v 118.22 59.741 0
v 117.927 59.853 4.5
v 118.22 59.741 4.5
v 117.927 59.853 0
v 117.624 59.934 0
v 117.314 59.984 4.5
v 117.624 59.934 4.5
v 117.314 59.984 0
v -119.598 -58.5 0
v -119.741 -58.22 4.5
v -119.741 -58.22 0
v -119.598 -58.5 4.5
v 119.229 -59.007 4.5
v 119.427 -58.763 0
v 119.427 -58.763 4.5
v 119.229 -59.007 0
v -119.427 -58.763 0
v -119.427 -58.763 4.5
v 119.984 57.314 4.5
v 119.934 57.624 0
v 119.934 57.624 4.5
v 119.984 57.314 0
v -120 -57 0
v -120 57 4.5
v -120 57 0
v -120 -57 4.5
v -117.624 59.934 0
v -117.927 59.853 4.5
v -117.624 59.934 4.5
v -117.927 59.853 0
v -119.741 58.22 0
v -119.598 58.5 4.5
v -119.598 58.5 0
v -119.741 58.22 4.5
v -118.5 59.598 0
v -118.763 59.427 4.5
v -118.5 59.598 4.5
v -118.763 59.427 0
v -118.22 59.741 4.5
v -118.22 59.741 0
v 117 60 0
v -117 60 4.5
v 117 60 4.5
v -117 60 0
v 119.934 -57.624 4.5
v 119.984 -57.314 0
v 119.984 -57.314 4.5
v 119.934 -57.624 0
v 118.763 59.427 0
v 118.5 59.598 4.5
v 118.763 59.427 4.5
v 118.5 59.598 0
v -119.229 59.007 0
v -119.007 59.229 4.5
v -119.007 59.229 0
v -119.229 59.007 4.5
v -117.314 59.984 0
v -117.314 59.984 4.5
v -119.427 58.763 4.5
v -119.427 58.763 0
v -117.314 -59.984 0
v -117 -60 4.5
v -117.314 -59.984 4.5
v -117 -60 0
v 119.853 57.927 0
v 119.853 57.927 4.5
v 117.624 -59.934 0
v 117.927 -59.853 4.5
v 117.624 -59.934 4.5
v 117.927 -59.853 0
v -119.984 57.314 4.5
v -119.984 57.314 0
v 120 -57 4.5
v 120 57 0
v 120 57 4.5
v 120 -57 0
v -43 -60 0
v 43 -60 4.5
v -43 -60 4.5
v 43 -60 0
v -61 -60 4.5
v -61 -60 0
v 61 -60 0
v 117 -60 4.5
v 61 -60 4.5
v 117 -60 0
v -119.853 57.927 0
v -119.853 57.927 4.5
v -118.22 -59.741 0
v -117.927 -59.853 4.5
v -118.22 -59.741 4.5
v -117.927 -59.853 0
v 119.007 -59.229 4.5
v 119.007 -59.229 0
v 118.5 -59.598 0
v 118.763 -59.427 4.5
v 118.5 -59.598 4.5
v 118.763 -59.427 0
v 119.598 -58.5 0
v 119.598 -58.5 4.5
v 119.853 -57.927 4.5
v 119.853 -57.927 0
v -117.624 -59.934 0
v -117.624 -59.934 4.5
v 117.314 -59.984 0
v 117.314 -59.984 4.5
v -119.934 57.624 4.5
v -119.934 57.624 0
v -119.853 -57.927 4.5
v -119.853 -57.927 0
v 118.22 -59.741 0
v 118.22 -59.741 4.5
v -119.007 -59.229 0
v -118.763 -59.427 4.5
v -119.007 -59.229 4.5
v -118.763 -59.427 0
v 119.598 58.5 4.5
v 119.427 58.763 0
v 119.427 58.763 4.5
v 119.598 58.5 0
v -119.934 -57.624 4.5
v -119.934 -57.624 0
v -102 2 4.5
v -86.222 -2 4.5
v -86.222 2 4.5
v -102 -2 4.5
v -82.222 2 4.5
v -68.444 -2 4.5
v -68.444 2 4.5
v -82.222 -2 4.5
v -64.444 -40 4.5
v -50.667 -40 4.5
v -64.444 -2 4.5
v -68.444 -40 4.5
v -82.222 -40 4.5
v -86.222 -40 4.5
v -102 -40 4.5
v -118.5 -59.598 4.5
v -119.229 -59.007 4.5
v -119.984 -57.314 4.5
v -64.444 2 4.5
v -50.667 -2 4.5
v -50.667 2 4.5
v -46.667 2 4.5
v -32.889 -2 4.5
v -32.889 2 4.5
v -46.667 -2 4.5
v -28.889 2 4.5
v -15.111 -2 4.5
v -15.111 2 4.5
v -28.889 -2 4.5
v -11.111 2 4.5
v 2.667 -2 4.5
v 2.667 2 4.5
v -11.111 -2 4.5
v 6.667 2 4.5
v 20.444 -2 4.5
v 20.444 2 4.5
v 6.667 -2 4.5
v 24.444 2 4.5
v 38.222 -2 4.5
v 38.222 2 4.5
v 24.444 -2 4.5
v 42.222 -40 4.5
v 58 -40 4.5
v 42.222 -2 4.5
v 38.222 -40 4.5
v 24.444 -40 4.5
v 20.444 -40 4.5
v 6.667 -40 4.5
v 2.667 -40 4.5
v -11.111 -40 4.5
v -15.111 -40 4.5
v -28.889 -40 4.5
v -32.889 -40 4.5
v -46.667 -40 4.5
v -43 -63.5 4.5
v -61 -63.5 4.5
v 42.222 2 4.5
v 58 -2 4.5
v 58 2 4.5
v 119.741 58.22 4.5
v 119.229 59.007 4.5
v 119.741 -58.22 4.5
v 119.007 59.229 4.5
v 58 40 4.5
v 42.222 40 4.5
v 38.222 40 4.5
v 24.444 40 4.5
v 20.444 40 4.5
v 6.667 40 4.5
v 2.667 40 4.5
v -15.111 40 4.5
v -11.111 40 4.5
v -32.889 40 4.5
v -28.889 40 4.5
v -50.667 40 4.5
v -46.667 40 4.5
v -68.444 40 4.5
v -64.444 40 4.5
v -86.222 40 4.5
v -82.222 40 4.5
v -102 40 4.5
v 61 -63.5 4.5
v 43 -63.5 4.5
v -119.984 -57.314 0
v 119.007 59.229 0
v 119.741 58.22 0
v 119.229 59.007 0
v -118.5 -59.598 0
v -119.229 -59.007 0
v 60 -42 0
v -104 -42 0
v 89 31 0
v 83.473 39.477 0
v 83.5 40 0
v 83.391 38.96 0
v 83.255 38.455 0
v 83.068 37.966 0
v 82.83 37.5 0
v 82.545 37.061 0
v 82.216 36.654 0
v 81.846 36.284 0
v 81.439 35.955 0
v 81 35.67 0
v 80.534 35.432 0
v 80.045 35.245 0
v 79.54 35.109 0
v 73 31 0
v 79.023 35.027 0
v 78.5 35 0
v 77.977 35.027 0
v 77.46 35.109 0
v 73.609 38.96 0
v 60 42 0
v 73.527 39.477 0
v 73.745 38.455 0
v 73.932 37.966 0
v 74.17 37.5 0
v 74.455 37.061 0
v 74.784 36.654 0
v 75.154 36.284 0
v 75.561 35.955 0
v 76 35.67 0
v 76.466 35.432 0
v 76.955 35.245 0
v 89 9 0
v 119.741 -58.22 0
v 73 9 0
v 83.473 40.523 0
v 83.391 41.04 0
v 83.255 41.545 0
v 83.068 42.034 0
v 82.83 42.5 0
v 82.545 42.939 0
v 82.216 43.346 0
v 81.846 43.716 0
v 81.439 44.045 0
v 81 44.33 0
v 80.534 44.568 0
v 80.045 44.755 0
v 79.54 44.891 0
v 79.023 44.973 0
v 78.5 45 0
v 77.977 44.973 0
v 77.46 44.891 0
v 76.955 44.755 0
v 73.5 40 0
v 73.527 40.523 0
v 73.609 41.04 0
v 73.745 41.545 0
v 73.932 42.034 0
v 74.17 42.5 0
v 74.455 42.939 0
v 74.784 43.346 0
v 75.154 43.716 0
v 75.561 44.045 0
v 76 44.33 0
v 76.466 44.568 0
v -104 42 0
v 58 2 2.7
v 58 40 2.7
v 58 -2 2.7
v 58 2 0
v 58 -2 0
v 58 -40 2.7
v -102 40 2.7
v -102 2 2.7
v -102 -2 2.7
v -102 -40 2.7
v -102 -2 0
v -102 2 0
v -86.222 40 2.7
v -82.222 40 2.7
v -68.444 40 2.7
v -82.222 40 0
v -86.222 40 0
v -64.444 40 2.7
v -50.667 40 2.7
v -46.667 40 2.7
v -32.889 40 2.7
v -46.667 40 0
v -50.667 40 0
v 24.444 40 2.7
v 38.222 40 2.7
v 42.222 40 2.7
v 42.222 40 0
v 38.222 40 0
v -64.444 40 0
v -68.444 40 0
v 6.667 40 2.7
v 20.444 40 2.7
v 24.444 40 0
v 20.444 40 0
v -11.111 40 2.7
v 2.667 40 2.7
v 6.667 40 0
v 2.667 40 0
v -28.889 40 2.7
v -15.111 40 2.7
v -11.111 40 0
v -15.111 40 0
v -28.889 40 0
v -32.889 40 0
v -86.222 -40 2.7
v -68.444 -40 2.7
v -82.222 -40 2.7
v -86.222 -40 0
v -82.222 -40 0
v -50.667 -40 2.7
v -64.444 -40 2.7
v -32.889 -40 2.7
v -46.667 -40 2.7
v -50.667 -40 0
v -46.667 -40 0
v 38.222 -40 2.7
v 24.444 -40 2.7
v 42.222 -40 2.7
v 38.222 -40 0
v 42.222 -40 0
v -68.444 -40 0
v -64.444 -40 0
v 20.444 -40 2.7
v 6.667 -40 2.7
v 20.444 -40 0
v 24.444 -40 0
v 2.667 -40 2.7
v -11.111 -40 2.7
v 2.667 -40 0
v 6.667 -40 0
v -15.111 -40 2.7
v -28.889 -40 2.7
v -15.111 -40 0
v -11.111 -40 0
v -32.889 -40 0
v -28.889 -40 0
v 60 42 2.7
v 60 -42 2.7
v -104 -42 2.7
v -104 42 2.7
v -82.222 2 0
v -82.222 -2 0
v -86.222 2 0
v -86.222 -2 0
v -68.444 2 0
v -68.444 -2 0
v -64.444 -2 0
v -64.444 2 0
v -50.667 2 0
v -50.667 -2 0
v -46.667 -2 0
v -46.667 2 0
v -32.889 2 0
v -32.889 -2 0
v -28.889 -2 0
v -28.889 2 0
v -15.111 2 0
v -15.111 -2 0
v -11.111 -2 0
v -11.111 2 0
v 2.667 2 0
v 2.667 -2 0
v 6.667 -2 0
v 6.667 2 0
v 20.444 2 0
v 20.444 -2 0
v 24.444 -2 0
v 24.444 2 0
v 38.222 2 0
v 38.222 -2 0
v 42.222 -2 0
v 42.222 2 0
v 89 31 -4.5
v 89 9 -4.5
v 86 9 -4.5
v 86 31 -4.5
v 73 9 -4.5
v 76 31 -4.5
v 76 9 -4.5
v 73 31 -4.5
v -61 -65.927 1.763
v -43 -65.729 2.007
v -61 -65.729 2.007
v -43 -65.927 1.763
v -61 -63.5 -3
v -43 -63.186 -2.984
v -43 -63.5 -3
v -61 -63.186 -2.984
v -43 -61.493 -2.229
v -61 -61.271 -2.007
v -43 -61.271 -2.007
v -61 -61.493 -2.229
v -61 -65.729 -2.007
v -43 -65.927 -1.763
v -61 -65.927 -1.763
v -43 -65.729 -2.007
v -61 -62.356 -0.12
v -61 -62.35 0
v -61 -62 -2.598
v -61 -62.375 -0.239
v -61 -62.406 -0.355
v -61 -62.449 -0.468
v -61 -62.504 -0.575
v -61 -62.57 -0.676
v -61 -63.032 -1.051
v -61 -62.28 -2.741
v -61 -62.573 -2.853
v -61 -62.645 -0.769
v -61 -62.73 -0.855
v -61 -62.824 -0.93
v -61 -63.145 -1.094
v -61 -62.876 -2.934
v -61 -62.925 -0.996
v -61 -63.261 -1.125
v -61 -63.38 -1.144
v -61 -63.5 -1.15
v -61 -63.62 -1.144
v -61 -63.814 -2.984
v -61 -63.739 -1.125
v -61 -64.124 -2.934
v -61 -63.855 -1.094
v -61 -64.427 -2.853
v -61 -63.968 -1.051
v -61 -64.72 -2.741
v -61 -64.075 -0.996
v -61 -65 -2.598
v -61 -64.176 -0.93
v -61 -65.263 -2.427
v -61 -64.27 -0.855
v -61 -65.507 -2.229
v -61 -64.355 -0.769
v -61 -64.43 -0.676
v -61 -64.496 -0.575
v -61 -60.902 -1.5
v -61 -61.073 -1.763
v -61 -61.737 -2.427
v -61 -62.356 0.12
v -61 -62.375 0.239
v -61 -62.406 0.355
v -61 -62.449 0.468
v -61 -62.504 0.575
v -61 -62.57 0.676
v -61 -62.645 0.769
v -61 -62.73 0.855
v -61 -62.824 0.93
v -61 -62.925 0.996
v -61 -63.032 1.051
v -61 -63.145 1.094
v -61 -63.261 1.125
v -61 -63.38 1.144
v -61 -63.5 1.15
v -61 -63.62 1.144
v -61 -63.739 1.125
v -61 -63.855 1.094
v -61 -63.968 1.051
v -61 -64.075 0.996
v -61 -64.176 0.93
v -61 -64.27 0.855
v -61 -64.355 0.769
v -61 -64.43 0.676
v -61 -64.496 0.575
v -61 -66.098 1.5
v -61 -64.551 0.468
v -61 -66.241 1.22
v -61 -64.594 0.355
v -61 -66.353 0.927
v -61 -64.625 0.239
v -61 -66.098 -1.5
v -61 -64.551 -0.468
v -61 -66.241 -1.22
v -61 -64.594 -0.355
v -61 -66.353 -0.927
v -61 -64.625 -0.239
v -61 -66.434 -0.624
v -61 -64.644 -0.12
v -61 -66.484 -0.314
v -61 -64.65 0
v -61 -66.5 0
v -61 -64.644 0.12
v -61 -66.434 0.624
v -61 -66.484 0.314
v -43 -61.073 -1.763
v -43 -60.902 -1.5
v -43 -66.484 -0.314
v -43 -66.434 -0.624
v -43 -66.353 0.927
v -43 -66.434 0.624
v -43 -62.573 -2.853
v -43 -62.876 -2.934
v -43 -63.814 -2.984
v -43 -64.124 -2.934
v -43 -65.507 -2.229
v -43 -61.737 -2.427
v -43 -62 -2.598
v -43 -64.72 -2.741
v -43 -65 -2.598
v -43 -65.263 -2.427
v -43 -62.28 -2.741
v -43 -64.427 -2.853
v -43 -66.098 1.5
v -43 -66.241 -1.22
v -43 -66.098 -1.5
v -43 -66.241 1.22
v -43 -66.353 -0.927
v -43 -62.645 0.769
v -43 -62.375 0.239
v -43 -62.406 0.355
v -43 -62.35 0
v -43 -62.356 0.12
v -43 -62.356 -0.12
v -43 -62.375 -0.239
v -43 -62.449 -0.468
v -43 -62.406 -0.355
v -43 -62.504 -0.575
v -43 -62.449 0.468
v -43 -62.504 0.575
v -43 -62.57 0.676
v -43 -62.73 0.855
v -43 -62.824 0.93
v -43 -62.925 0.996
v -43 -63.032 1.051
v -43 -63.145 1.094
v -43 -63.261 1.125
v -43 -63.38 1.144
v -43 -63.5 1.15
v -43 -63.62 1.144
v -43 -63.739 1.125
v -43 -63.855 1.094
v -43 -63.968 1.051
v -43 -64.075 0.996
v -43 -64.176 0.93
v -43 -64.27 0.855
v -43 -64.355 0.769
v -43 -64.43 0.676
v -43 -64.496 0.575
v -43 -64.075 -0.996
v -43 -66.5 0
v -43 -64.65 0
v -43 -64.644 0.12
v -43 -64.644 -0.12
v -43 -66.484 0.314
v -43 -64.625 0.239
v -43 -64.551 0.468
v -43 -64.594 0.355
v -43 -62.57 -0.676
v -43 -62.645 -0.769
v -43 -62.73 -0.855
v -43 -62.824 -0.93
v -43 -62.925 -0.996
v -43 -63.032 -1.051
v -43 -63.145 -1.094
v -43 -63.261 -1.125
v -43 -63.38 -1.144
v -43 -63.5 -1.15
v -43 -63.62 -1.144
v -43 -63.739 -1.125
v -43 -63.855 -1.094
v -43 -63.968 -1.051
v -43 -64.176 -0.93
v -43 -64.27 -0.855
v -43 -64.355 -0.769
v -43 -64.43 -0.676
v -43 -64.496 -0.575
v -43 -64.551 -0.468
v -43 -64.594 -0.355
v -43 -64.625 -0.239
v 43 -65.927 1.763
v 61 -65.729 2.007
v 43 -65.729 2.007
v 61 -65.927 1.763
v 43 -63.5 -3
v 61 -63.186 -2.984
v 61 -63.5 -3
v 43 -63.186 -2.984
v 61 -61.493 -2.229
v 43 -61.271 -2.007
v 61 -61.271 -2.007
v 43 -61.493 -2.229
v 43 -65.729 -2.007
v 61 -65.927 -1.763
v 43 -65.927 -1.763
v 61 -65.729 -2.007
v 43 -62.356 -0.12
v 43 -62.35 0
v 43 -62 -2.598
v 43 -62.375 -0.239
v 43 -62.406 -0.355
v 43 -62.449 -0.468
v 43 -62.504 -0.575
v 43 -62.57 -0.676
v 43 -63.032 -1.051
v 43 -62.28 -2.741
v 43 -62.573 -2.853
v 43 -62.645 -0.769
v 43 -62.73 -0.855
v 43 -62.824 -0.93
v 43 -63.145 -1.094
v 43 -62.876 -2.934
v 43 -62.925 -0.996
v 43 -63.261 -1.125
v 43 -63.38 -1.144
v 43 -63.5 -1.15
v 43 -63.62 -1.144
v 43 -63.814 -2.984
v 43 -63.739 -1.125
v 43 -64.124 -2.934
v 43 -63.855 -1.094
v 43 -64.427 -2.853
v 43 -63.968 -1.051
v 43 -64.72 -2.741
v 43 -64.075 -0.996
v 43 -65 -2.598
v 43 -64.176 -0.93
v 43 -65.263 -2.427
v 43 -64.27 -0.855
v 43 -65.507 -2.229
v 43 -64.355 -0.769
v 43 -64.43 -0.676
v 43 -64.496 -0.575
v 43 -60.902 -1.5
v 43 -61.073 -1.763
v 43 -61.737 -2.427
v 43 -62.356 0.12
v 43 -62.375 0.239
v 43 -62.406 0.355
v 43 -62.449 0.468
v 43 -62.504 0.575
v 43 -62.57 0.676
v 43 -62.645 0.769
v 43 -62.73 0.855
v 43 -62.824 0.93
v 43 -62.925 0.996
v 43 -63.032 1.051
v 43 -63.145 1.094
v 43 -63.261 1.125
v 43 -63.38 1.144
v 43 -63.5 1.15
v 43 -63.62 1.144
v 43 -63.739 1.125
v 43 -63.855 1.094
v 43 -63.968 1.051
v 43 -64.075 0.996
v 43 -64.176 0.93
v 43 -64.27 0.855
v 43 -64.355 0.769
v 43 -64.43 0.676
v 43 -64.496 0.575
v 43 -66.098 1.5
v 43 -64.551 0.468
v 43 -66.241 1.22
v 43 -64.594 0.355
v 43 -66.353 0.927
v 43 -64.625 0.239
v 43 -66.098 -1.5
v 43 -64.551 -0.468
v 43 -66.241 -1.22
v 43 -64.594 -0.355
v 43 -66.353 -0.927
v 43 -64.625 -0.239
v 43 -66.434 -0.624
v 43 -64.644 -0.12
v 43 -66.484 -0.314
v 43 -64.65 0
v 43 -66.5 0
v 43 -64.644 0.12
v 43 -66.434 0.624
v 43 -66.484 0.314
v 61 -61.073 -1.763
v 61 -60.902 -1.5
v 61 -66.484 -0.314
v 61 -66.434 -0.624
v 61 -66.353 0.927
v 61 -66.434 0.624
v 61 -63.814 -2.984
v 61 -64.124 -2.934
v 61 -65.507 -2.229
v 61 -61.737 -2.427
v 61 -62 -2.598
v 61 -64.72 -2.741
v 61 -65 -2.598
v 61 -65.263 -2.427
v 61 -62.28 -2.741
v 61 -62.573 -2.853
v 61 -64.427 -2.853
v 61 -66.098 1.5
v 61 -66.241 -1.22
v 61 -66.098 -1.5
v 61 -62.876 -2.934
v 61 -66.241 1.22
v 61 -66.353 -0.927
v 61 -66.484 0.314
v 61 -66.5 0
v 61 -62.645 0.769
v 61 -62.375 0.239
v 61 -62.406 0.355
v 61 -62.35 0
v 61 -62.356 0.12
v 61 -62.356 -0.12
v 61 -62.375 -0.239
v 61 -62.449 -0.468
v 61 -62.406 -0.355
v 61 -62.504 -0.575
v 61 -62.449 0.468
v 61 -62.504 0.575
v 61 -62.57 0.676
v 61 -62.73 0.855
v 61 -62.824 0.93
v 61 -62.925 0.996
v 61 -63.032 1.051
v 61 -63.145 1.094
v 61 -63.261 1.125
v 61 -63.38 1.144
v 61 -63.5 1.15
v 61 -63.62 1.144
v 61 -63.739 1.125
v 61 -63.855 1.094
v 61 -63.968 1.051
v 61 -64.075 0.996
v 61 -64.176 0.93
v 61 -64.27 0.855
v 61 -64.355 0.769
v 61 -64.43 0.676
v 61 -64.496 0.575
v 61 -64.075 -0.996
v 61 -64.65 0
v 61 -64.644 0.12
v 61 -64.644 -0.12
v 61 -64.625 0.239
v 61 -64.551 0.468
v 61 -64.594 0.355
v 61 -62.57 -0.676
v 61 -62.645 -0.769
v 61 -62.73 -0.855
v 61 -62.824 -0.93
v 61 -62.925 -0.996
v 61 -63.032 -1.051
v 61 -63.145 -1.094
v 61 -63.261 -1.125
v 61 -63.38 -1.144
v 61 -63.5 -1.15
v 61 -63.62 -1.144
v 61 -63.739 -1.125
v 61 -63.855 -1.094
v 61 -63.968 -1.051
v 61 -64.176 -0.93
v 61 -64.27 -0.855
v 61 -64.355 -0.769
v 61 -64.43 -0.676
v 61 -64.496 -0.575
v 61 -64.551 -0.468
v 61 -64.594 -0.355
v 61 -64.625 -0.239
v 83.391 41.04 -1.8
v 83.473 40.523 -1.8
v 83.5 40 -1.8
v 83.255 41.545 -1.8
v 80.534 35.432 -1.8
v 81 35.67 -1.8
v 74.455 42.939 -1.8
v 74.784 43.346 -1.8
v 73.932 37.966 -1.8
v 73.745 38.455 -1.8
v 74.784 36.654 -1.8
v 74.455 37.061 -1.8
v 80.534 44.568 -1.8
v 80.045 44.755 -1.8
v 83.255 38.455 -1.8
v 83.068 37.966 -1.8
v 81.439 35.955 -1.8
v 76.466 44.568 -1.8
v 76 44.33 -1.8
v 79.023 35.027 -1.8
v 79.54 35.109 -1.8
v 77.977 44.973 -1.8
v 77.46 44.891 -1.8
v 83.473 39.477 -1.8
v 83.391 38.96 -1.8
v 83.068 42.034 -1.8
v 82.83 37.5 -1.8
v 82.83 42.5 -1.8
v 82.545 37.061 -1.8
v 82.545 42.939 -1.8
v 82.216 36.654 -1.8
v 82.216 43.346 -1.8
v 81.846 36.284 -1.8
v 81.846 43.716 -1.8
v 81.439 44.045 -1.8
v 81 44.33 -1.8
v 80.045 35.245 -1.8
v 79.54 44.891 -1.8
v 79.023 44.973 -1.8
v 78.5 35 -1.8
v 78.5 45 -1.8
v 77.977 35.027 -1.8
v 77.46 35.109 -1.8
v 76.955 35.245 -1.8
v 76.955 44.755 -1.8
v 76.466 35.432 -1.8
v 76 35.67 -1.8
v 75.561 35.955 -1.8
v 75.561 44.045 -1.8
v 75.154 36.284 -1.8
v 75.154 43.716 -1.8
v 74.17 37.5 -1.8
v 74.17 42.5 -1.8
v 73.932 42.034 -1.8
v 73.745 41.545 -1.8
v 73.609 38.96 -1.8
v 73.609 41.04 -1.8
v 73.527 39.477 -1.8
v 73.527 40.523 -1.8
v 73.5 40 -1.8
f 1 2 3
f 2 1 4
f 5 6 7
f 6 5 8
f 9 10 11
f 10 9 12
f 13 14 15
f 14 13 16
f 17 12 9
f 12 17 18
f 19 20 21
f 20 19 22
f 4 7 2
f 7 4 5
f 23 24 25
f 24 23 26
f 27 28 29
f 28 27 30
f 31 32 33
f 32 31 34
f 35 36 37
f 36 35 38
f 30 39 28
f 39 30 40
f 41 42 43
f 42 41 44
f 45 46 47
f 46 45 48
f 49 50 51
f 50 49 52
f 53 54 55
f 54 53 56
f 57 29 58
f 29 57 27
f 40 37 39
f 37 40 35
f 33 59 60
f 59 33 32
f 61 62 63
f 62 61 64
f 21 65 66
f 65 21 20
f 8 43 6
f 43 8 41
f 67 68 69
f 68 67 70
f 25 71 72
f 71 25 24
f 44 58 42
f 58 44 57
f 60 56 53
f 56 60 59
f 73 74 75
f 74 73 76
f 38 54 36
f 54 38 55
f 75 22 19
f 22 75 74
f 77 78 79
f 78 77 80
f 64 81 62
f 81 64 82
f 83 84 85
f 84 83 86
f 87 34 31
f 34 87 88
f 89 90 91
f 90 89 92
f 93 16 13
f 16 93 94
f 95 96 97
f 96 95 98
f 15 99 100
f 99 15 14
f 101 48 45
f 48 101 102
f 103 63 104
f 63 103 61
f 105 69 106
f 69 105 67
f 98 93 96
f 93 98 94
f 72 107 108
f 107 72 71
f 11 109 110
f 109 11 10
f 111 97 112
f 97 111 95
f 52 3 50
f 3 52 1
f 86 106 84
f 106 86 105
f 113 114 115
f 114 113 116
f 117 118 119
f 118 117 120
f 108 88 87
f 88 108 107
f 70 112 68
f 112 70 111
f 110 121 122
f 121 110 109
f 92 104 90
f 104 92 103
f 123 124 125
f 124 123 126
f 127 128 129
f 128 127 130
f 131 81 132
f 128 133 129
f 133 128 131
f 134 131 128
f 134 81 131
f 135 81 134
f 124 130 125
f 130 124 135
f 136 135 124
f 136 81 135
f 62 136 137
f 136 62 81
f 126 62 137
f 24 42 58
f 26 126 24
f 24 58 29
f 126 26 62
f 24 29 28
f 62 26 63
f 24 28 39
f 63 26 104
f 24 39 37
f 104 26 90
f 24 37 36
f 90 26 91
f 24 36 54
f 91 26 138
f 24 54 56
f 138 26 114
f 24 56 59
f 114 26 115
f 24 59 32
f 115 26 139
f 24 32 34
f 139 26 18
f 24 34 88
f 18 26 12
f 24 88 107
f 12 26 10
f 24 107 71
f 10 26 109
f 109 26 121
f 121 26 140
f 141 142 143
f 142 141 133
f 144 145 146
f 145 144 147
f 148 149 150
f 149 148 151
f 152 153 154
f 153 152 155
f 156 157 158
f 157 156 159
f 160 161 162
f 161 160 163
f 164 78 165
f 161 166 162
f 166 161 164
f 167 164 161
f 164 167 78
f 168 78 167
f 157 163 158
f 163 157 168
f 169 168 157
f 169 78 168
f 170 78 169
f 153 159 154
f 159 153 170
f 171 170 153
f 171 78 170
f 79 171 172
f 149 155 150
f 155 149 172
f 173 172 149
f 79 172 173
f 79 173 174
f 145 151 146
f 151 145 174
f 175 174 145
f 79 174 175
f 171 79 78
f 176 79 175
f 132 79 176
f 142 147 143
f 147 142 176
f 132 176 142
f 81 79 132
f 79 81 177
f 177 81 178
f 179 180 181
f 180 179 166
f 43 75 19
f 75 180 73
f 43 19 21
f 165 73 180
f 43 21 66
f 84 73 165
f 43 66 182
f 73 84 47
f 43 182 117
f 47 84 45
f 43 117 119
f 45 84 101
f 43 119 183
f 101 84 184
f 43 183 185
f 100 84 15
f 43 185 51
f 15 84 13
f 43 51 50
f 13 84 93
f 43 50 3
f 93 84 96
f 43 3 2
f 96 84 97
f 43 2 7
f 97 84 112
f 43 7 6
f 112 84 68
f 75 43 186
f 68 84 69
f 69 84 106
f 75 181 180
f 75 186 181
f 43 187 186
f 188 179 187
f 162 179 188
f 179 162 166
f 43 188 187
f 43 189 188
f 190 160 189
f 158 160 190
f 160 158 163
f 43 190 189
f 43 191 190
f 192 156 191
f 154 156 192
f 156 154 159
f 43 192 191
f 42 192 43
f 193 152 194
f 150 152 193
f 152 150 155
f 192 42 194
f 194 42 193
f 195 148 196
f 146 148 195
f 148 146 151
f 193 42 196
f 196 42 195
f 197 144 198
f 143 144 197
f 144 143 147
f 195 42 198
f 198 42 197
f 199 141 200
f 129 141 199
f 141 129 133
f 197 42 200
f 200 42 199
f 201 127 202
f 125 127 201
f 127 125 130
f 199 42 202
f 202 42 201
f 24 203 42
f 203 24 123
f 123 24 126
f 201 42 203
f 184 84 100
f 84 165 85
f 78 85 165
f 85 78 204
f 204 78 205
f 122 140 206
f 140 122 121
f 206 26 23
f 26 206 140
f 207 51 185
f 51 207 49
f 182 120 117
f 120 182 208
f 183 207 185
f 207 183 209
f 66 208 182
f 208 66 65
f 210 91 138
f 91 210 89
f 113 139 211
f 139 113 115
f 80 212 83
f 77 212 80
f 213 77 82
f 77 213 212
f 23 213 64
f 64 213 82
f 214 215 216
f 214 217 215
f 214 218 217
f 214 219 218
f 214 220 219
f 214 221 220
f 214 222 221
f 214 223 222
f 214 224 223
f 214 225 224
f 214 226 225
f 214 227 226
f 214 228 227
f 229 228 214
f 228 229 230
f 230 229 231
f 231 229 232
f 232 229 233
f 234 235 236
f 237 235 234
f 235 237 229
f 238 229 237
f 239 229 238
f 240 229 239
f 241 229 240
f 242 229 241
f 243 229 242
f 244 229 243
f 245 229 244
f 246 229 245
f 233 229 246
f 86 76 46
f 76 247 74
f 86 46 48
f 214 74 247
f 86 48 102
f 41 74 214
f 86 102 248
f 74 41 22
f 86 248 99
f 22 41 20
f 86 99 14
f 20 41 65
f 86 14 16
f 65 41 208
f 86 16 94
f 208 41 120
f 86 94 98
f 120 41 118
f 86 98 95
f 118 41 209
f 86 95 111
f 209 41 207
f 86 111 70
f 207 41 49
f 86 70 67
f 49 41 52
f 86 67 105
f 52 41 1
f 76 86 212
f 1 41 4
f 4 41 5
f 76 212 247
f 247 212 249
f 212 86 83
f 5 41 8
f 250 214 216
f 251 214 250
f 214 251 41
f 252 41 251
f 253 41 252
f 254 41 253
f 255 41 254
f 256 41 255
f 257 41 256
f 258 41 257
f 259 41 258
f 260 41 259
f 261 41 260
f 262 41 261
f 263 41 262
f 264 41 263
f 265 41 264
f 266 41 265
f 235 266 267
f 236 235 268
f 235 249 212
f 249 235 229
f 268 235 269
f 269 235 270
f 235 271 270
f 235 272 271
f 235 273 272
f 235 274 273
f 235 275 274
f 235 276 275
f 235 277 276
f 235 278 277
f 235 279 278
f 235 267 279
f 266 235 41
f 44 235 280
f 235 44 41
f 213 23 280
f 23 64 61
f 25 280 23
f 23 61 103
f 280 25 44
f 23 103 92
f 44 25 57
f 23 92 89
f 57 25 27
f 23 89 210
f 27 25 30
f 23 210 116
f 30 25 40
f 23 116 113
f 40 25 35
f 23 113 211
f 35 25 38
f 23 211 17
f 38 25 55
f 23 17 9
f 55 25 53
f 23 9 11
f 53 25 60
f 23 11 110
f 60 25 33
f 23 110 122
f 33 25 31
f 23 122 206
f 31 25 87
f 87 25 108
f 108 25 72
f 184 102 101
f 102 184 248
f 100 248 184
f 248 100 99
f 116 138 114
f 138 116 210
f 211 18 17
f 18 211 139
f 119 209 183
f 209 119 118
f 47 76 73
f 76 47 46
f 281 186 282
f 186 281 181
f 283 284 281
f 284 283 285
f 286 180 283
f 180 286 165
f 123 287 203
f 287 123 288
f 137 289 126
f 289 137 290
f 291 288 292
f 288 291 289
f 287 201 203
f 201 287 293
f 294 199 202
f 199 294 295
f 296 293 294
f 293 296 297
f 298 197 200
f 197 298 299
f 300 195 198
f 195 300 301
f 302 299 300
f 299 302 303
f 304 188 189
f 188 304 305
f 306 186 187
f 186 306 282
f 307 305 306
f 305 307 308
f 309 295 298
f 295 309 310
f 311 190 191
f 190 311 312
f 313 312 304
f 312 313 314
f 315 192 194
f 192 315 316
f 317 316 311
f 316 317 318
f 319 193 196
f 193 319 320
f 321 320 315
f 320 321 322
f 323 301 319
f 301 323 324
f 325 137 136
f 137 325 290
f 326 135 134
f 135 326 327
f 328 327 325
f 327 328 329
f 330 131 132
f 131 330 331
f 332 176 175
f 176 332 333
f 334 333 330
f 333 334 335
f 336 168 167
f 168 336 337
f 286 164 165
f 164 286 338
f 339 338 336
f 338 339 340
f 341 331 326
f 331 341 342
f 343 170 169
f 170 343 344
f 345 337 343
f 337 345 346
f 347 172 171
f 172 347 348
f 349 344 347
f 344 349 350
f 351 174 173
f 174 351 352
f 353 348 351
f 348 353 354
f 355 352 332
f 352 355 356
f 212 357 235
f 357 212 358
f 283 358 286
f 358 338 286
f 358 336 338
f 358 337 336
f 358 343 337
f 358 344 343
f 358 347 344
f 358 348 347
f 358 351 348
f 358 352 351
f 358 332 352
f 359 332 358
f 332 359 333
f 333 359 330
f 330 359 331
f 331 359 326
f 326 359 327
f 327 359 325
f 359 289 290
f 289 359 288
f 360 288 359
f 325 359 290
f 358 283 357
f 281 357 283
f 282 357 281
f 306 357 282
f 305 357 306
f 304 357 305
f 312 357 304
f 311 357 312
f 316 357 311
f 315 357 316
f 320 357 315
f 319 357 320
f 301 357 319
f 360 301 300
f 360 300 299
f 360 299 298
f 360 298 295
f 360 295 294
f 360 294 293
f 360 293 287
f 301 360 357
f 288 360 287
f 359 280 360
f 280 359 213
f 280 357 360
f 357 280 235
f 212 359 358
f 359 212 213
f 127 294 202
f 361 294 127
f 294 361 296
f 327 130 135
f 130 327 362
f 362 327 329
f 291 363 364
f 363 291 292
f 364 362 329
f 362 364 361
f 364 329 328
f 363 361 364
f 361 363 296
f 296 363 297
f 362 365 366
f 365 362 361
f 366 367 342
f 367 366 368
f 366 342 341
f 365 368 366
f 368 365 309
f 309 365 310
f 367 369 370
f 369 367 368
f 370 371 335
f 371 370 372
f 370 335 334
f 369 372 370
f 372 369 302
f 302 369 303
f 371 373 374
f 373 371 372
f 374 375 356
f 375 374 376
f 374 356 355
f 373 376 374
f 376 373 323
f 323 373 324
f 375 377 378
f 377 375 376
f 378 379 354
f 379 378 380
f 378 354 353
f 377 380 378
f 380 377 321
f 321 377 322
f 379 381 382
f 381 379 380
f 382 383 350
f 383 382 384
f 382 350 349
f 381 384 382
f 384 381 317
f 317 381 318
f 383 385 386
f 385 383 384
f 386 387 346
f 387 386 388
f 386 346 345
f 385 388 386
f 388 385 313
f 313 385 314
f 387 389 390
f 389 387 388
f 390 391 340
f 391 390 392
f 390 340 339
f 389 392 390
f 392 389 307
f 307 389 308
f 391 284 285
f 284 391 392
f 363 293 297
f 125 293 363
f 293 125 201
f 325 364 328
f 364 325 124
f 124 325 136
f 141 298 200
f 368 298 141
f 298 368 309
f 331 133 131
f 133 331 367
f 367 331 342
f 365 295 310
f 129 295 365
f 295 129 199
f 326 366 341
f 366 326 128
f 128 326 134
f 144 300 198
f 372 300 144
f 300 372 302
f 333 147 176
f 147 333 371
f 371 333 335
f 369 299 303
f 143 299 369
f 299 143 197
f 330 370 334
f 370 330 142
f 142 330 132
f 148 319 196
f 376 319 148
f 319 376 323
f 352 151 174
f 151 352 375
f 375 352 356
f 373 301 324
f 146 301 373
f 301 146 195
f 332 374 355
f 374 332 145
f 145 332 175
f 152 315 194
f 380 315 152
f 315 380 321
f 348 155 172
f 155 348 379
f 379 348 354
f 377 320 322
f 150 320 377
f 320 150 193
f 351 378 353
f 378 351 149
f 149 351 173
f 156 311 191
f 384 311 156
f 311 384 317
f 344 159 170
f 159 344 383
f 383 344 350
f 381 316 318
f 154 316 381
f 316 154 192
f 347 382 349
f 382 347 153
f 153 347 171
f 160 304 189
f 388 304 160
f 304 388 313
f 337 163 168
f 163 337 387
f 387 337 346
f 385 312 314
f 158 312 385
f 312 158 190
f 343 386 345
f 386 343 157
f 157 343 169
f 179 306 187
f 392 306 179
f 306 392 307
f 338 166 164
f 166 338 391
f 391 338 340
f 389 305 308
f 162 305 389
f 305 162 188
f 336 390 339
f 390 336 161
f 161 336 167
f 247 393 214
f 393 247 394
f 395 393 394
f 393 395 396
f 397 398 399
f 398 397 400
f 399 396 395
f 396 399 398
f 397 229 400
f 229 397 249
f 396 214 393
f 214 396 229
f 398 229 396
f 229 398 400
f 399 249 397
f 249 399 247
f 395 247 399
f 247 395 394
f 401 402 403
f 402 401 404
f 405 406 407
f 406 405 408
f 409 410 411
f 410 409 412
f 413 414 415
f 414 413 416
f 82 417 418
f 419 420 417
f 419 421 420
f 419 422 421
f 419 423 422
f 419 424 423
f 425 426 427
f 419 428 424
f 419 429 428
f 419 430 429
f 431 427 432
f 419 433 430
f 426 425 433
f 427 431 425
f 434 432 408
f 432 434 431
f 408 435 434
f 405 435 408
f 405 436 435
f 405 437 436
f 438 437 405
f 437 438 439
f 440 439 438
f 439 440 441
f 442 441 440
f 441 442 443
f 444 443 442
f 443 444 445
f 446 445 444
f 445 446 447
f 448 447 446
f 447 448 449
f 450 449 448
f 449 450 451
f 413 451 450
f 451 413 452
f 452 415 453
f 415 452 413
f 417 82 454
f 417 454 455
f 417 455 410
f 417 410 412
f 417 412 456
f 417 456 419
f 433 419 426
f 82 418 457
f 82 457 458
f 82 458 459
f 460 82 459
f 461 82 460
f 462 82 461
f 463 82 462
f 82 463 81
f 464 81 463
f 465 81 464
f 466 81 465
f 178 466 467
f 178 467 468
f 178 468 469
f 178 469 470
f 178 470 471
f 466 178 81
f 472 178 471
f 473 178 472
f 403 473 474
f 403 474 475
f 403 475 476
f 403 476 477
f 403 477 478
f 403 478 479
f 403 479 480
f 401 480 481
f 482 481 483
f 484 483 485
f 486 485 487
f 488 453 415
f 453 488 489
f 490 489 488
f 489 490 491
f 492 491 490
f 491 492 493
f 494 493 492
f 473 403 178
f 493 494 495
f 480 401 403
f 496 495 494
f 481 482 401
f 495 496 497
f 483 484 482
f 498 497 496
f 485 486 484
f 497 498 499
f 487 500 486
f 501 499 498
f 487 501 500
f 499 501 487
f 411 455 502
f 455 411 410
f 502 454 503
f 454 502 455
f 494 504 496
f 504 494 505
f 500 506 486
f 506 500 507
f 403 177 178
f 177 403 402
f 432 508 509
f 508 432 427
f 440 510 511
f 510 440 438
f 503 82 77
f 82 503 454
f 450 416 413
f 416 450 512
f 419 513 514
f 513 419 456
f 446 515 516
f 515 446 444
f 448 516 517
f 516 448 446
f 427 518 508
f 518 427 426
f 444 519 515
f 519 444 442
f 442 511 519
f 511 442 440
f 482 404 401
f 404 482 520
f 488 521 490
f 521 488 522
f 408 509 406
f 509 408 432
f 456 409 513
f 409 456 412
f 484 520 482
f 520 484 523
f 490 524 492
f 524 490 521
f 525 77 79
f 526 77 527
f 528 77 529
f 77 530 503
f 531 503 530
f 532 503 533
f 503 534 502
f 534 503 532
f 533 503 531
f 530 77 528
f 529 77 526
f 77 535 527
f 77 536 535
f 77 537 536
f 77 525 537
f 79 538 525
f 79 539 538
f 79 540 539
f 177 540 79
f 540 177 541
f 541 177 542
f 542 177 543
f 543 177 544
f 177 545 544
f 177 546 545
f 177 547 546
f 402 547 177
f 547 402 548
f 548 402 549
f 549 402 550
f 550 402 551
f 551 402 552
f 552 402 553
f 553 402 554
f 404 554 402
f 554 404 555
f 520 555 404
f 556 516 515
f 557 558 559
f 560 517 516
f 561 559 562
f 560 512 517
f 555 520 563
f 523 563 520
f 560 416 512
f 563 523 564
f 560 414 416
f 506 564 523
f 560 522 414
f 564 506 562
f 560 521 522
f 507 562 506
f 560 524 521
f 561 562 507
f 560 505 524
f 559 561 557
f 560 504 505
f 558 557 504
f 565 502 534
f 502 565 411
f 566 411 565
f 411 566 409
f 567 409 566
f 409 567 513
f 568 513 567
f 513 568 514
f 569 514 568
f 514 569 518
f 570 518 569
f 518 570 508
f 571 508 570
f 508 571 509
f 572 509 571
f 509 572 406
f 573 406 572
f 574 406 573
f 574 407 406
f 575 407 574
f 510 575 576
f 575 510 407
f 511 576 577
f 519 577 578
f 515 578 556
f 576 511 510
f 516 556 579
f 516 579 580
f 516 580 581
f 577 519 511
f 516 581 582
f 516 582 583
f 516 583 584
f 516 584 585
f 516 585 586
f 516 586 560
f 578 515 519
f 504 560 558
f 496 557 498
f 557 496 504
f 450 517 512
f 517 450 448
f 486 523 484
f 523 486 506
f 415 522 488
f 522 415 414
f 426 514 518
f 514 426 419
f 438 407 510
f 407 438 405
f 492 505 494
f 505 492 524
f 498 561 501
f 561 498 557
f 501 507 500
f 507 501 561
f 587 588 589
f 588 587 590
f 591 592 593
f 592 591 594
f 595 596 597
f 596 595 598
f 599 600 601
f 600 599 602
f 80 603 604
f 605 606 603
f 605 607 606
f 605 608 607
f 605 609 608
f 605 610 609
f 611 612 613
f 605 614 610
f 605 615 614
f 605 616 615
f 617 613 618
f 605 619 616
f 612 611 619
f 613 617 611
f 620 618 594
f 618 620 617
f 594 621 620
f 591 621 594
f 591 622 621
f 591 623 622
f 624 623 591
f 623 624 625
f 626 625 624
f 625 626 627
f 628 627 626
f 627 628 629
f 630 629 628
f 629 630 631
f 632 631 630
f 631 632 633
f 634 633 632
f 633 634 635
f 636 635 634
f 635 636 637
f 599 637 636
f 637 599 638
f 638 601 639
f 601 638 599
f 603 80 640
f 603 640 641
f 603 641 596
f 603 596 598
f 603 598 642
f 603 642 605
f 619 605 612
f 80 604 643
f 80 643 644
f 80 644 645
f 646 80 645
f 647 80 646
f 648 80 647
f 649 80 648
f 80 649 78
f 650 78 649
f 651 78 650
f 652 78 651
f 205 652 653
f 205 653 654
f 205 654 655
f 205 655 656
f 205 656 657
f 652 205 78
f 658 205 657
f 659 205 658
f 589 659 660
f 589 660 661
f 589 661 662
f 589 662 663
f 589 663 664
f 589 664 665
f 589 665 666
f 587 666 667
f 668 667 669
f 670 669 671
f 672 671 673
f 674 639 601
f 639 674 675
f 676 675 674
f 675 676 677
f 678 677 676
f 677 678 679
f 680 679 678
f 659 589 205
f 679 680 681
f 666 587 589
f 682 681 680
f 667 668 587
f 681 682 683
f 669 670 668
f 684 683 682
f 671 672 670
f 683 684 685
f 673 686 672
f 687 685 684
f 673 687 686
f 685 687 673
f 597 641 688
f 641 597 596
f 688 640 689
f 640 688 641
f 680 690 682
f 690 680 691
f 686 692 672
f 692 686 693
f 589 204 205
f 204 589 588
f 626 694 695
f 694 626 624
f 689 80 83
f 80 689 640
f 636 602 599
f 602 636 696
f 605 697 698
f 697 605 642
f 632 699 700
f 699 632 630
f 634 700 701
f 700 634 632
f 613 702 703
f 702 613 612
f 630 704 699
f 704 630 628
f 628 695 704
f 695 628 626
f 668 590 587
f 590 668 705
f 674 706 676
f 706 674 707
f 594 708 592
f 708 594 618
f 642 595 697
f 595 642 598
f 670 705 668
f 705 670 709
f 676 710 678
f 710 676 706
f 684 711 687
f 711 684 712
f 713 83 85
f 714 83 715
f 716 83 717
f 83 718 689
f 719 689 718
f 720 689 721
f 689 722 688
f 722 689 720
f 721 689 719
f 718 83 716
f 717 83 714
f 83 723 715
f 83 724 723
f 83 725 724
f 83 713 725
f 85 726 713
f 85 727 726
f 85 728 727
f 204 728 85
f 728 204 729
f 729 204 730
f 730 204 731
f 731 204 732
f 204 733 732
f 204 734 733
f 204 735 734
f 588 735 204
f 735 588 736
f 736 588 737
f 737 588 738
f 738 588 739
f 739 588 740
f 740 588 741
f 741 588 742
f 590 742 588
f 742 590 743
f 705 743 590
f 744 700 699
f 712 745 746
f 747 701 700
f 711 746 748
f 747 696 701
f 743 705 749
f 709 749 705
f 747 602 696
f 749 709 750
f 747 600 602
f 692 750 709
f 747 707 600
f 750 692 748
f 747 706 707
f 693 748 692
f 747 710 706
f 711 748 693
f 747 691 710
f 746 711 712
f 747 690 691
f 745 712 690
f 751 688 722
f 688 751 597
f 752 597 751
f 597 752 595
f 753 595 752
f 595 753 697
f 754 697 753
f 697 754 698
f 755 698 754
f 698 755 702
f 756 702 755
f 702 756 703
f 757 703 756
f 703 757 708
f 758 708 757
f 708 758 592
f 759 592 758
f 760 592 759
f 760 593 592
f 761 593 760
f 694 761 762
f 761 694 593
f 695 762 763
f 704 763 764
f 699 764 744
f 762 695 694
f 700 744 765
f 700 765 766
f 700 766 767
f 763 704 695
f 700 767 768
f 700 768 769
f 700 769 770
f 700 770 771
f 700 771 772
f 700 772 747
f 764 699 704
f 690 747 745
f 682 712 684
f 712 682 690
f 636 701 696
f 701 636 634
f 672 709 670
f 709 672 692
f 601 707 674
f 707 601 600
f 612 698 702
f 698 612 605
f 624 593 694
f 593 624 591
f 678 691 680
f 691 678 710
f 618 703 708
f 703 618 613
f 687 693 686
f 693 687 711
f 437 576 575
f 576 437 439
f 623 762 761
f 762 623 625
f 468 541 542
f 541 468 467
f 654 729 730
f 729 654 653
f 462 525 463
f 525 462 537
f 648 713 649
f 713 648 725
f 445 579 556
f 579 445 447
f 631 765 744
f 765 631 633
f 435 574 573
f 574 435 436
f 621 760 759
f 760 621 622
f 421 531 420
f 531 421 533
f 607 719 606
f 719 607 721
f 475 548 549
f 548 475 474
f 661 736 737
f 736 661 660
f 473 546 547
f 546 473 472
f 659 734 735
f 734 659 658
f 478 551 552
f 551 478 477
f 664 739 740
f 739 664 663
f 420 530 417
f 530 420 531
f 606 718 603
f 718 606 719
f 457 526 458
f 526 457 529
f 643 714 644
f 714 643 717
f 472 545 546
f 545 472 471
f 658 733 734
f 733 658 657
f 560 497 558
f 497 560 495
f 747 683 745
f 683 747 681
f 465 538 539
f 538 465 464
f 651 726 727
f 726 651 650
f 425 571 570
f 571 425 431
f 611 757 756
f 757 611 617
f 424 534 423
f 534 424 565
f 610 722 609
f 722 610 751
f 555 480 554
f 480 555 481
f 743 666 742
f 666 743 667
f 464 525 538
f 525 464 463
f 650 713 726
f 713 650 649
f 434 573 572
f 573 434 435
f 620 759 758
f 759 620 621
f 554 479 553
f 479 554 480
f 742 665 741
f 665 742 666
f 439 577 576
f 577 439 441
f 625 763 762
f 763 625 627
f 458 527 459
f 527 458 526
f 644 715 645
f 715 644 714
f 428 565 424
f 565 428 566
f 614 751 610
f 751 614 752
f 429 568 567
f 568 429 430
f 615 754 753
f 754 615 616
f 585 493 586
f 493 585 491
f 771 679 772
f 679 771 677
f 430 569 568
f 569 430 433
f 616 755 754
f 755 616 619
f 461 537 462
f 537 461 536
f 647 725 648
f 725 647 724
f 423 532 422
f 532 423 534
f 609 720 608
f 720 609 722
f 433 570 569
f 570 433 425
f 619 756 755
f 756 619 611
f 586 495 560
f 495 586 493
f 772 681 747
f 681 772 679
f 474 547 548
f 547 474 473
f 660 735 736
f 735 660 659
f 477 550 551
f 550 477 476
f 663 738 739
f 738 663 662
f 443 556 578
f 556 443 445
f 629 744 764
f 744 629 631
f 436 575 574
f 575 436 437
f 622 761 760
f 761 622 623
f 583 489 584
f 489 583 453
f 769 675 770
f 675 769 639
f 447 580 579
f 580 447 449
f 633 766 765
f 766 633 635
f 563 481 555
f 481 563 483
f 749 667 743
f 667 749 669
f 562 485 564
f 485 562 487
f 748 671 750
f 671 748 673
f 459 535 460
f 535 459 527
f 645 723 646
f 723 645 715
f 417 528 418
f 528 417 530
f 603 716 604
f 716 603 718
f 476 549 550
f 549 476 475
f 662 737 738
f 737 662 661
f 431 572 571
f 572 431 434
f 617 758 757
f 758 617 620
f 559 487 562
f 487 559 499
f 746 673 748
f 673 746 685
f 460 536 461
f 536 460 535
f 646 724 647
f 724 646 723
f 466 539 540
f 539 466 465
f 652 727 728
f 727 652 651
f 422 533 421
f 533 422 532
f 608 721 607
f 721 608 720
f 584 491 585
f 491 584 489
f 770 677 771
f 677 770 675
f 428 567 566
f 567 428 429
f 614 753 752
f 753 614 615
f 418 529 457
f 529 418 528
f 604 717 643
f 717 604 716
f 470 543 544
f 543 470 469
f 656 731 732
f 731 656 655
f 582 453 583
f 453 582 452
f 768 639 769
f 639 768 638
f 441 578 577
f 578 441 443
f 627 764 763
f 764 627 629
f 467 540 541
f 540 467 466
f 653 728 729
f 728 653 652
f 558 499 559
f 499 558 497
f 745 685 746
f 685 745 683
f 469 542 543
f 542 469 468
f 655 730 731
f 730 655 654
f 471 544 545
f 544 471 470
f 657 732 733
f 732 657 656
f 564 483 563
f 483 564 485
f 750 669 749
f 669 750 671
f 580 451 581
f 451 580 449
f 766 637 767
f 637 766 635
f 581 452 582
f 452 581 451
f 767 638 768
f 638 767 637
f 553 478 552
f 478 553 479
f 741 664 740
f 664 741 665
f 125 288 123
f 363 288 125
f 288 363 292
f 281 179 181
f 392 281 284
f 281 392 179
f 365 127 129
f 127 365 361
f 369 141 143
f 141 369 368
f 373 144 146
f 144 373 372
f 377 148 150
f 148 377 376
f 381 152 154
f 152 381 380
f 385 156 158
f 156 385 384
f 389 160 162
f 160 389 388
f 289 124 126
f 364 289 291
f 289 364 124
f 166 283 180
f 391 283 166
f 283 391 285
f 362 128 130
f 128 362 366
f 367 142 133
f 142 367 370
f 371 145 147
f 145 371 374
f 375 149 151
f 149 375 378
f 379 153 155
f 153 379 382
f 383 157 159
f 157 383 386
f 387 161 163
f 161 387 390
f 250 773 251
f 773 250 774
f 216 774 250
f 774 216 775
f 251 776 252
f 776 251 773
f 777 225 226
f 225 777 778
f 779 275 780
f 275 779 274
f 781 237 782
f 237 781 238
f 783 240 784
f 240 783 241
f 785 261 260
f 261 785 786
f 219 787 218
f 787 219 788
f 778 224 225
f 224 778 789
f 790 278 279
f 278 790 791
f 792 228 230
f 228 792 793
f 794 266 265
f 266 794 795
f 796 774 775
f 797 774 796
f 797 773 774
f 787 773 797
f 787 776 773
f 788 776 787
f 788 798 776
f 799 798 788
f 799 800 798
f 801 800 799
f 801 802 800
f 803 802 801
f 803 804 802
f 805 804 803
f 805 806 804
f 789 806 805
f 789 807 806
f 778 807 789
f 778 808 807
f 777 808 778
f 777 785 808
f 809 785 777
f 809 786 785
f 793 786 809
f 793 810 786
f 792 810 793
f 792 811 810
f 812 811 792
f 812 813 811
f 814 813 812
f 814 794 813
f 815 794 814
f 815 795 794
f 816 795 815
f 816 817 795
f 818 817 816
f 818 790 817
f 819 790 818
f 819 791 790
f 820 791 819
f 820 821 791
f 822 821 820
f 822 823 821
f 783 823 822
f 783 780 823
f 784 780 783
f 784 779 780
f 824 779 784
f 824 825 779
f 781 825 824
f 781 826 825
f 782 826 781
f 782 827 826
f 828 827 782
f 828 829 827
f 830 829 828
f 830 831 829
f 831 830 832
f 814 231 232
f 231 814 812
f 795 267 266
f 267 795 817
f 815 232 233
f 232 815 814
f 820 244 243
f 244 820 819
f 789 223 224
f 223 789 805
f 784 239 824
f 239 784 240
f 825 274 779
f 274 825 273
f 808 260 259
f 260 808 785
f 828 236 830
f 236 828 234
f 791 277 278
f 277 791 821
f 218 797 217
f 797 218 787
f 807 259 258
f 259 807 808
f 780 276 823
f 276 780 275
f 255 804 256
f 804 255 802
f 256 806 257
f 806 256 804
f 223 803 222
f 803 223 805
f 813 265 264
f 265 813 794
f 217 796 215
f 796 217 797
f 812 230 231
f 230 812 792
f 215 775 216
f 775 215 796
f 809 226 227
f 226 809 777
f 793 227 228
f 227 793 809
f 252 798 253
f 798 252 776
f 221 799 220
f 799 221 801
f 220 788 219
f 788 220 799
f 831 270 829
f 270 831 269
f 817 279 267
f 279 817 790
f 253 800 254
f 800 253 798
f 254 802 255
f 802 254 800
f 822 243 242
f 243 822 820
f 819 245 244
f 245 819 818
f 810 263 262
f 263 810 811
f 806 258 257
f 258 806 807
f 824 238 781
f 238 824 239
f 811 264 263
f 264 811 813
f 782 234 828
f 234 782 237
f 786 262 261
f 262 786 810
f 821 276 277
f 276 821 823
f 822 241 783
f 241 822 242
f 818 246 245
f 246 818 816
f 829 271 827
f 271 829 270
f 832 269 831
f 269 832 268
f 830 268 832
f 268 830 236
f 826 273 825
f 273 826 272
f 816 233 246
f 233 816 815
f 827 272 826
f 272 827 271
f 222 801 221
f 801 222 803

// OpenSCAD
// ===================================================================
// 智能玩具电子锁盒 - 零部件 2: 顶盖 (Top Lid with Armored Skylight)
// CAD 级高精度生产模型
// ===================================================================

$fn = 60;

total_length   = 240.0;
total_width    = 120.0;
lid_thickness  = 4.5;
fillet_r       = 3.0;

// 天窗视窗尺寸
win_length     = 160.0;
win_width      = 80.0;
win_center_x   = -22.0;
acrylic_thick  = 2.5;

module top_lid() {
    difference() {
        // 1. 顶盖主平板基体 (带倒角)
        hull() {
            translate([-total_length/2 + fillet_r, -total_width/2 + fillet_r, 0])
                cylinder(r=fillet_r, h=lid_thickness);
            translate([total_length/2 - fillet_r, -total_width/2 + fillet_r, 0])
                cylinder(r=fillet_r, h=lid_thickness);
            translate([-total_length/2 + fillet_r, total_width/2 - fillet_r, 0])
                cylinder(r=fillet_r, h=lid_thickness);
            translate([total_length/2 - fillet_r, total_width/2 - fillet_r, 0])
                cylinder(r=fillet_r, h=lid_thickness);
        }

        // 2. 挖空天窗视窗通孔
        translate([win_center_x - win_length/2, -win_width/2, -1])
            cube([win_length, win_width, lid_thickness + 2]);

        // 3. 挖出内侧亚克力沉槽 (Under Pocket, 留 2.5mm 深台阶)
        translate([win_center_x - win_length/2 - 2, -win_width/2 - 2, -0.1])
            cube([win_length + 4, win_width + 4, acrylic_thick + 0.3]);
    }

    // --- 4. 一体化重型防暴格栅 (Prison Bars) ---
    // 8 根横向跨梁 (跨过 win_width)
    rib_count = 8;
    rib_width = 4.0;
    spacing = win_length / (rib_count + 1);

    for (i = [1 : rib_count]) {
        translate([win_center_x - win_length/2 + i * spacing - rib_width/2, -win_width/2, 0])
            cube([rib_width, win_width, lid_thickness]);
    }

    // 1 根纵向中心大梁 (Spine)
    translate([win_center_x - win_length/2, -2.0, 0])
        cube([win_length, 4.0, lid_thickness]);

    // --- 5. 顶盖内侧燕尾滑槽 (Dovetail Female Rail) ---
    // 位置: 靠近隔板锁钩处 (X = 81, Y = 20)
    translate([81 - 8, 20 - 11, -4.5]) {
        difference() {
            // 外滑槽座
            cube([16, 22, 4.5]);
            // 内部燕尾母槽 (倒梯形)
            translate([8, -1, 0])
                rotate([-90, 0, 0])
                linear_extrude(height=24)
                polygon(points=[[-5, 0], [5, 0], [7, 4.6], [-7, 4.6]]);
        }
    }

    // --- 6. 后置铰链公耳 (Mating Hinge Knuckles at Y=-total_width/2) ---
    // 销轴中心位于分型面 Z=0.0, 外挑 Y=-63.5，圆柱外径 Ø6.0mm
    difference() {
        union() {
            for (kx = [-80 + 19, 80 - 18 - 19]) {
                hull() {
                    // 圆柱形转轴节套 (与销轴同心)
                    translate([kx, -total_width/2 - 3.5, 0])
                        rotate([0, 90, 0])
                        cylinder(r=3.0, h=18);
                    // 向上延伸融合至顶盖主板框架 (Z=0 到 4.5, Y=-63.5 到 -60.0)
                    translate([kx, -total_width/2 - 3.5, 0])
                        cube([18, 3.5, lid_thickness]);
                }
            }
        }
        // 销钉穿孔 (直径 2.3mm)
        translate([-100, -total_width/2 - 3.5, 0])
            rotate([0, 90, 0])
            cylinder(d=2.3, h=200);
    }

    // --- 7. 弹簧顶针接触承力垫块 (Spring Plunger Striker Pad) ---
    // 位于顶盖内侧 (X=78.5, Y=40)，为弹簧顶针提供平整稳固受力接触面
    translate([82 - 3.5, 40, -1.8])
        cylinder(d=10.0, h=1.8);
}

top_lid();
